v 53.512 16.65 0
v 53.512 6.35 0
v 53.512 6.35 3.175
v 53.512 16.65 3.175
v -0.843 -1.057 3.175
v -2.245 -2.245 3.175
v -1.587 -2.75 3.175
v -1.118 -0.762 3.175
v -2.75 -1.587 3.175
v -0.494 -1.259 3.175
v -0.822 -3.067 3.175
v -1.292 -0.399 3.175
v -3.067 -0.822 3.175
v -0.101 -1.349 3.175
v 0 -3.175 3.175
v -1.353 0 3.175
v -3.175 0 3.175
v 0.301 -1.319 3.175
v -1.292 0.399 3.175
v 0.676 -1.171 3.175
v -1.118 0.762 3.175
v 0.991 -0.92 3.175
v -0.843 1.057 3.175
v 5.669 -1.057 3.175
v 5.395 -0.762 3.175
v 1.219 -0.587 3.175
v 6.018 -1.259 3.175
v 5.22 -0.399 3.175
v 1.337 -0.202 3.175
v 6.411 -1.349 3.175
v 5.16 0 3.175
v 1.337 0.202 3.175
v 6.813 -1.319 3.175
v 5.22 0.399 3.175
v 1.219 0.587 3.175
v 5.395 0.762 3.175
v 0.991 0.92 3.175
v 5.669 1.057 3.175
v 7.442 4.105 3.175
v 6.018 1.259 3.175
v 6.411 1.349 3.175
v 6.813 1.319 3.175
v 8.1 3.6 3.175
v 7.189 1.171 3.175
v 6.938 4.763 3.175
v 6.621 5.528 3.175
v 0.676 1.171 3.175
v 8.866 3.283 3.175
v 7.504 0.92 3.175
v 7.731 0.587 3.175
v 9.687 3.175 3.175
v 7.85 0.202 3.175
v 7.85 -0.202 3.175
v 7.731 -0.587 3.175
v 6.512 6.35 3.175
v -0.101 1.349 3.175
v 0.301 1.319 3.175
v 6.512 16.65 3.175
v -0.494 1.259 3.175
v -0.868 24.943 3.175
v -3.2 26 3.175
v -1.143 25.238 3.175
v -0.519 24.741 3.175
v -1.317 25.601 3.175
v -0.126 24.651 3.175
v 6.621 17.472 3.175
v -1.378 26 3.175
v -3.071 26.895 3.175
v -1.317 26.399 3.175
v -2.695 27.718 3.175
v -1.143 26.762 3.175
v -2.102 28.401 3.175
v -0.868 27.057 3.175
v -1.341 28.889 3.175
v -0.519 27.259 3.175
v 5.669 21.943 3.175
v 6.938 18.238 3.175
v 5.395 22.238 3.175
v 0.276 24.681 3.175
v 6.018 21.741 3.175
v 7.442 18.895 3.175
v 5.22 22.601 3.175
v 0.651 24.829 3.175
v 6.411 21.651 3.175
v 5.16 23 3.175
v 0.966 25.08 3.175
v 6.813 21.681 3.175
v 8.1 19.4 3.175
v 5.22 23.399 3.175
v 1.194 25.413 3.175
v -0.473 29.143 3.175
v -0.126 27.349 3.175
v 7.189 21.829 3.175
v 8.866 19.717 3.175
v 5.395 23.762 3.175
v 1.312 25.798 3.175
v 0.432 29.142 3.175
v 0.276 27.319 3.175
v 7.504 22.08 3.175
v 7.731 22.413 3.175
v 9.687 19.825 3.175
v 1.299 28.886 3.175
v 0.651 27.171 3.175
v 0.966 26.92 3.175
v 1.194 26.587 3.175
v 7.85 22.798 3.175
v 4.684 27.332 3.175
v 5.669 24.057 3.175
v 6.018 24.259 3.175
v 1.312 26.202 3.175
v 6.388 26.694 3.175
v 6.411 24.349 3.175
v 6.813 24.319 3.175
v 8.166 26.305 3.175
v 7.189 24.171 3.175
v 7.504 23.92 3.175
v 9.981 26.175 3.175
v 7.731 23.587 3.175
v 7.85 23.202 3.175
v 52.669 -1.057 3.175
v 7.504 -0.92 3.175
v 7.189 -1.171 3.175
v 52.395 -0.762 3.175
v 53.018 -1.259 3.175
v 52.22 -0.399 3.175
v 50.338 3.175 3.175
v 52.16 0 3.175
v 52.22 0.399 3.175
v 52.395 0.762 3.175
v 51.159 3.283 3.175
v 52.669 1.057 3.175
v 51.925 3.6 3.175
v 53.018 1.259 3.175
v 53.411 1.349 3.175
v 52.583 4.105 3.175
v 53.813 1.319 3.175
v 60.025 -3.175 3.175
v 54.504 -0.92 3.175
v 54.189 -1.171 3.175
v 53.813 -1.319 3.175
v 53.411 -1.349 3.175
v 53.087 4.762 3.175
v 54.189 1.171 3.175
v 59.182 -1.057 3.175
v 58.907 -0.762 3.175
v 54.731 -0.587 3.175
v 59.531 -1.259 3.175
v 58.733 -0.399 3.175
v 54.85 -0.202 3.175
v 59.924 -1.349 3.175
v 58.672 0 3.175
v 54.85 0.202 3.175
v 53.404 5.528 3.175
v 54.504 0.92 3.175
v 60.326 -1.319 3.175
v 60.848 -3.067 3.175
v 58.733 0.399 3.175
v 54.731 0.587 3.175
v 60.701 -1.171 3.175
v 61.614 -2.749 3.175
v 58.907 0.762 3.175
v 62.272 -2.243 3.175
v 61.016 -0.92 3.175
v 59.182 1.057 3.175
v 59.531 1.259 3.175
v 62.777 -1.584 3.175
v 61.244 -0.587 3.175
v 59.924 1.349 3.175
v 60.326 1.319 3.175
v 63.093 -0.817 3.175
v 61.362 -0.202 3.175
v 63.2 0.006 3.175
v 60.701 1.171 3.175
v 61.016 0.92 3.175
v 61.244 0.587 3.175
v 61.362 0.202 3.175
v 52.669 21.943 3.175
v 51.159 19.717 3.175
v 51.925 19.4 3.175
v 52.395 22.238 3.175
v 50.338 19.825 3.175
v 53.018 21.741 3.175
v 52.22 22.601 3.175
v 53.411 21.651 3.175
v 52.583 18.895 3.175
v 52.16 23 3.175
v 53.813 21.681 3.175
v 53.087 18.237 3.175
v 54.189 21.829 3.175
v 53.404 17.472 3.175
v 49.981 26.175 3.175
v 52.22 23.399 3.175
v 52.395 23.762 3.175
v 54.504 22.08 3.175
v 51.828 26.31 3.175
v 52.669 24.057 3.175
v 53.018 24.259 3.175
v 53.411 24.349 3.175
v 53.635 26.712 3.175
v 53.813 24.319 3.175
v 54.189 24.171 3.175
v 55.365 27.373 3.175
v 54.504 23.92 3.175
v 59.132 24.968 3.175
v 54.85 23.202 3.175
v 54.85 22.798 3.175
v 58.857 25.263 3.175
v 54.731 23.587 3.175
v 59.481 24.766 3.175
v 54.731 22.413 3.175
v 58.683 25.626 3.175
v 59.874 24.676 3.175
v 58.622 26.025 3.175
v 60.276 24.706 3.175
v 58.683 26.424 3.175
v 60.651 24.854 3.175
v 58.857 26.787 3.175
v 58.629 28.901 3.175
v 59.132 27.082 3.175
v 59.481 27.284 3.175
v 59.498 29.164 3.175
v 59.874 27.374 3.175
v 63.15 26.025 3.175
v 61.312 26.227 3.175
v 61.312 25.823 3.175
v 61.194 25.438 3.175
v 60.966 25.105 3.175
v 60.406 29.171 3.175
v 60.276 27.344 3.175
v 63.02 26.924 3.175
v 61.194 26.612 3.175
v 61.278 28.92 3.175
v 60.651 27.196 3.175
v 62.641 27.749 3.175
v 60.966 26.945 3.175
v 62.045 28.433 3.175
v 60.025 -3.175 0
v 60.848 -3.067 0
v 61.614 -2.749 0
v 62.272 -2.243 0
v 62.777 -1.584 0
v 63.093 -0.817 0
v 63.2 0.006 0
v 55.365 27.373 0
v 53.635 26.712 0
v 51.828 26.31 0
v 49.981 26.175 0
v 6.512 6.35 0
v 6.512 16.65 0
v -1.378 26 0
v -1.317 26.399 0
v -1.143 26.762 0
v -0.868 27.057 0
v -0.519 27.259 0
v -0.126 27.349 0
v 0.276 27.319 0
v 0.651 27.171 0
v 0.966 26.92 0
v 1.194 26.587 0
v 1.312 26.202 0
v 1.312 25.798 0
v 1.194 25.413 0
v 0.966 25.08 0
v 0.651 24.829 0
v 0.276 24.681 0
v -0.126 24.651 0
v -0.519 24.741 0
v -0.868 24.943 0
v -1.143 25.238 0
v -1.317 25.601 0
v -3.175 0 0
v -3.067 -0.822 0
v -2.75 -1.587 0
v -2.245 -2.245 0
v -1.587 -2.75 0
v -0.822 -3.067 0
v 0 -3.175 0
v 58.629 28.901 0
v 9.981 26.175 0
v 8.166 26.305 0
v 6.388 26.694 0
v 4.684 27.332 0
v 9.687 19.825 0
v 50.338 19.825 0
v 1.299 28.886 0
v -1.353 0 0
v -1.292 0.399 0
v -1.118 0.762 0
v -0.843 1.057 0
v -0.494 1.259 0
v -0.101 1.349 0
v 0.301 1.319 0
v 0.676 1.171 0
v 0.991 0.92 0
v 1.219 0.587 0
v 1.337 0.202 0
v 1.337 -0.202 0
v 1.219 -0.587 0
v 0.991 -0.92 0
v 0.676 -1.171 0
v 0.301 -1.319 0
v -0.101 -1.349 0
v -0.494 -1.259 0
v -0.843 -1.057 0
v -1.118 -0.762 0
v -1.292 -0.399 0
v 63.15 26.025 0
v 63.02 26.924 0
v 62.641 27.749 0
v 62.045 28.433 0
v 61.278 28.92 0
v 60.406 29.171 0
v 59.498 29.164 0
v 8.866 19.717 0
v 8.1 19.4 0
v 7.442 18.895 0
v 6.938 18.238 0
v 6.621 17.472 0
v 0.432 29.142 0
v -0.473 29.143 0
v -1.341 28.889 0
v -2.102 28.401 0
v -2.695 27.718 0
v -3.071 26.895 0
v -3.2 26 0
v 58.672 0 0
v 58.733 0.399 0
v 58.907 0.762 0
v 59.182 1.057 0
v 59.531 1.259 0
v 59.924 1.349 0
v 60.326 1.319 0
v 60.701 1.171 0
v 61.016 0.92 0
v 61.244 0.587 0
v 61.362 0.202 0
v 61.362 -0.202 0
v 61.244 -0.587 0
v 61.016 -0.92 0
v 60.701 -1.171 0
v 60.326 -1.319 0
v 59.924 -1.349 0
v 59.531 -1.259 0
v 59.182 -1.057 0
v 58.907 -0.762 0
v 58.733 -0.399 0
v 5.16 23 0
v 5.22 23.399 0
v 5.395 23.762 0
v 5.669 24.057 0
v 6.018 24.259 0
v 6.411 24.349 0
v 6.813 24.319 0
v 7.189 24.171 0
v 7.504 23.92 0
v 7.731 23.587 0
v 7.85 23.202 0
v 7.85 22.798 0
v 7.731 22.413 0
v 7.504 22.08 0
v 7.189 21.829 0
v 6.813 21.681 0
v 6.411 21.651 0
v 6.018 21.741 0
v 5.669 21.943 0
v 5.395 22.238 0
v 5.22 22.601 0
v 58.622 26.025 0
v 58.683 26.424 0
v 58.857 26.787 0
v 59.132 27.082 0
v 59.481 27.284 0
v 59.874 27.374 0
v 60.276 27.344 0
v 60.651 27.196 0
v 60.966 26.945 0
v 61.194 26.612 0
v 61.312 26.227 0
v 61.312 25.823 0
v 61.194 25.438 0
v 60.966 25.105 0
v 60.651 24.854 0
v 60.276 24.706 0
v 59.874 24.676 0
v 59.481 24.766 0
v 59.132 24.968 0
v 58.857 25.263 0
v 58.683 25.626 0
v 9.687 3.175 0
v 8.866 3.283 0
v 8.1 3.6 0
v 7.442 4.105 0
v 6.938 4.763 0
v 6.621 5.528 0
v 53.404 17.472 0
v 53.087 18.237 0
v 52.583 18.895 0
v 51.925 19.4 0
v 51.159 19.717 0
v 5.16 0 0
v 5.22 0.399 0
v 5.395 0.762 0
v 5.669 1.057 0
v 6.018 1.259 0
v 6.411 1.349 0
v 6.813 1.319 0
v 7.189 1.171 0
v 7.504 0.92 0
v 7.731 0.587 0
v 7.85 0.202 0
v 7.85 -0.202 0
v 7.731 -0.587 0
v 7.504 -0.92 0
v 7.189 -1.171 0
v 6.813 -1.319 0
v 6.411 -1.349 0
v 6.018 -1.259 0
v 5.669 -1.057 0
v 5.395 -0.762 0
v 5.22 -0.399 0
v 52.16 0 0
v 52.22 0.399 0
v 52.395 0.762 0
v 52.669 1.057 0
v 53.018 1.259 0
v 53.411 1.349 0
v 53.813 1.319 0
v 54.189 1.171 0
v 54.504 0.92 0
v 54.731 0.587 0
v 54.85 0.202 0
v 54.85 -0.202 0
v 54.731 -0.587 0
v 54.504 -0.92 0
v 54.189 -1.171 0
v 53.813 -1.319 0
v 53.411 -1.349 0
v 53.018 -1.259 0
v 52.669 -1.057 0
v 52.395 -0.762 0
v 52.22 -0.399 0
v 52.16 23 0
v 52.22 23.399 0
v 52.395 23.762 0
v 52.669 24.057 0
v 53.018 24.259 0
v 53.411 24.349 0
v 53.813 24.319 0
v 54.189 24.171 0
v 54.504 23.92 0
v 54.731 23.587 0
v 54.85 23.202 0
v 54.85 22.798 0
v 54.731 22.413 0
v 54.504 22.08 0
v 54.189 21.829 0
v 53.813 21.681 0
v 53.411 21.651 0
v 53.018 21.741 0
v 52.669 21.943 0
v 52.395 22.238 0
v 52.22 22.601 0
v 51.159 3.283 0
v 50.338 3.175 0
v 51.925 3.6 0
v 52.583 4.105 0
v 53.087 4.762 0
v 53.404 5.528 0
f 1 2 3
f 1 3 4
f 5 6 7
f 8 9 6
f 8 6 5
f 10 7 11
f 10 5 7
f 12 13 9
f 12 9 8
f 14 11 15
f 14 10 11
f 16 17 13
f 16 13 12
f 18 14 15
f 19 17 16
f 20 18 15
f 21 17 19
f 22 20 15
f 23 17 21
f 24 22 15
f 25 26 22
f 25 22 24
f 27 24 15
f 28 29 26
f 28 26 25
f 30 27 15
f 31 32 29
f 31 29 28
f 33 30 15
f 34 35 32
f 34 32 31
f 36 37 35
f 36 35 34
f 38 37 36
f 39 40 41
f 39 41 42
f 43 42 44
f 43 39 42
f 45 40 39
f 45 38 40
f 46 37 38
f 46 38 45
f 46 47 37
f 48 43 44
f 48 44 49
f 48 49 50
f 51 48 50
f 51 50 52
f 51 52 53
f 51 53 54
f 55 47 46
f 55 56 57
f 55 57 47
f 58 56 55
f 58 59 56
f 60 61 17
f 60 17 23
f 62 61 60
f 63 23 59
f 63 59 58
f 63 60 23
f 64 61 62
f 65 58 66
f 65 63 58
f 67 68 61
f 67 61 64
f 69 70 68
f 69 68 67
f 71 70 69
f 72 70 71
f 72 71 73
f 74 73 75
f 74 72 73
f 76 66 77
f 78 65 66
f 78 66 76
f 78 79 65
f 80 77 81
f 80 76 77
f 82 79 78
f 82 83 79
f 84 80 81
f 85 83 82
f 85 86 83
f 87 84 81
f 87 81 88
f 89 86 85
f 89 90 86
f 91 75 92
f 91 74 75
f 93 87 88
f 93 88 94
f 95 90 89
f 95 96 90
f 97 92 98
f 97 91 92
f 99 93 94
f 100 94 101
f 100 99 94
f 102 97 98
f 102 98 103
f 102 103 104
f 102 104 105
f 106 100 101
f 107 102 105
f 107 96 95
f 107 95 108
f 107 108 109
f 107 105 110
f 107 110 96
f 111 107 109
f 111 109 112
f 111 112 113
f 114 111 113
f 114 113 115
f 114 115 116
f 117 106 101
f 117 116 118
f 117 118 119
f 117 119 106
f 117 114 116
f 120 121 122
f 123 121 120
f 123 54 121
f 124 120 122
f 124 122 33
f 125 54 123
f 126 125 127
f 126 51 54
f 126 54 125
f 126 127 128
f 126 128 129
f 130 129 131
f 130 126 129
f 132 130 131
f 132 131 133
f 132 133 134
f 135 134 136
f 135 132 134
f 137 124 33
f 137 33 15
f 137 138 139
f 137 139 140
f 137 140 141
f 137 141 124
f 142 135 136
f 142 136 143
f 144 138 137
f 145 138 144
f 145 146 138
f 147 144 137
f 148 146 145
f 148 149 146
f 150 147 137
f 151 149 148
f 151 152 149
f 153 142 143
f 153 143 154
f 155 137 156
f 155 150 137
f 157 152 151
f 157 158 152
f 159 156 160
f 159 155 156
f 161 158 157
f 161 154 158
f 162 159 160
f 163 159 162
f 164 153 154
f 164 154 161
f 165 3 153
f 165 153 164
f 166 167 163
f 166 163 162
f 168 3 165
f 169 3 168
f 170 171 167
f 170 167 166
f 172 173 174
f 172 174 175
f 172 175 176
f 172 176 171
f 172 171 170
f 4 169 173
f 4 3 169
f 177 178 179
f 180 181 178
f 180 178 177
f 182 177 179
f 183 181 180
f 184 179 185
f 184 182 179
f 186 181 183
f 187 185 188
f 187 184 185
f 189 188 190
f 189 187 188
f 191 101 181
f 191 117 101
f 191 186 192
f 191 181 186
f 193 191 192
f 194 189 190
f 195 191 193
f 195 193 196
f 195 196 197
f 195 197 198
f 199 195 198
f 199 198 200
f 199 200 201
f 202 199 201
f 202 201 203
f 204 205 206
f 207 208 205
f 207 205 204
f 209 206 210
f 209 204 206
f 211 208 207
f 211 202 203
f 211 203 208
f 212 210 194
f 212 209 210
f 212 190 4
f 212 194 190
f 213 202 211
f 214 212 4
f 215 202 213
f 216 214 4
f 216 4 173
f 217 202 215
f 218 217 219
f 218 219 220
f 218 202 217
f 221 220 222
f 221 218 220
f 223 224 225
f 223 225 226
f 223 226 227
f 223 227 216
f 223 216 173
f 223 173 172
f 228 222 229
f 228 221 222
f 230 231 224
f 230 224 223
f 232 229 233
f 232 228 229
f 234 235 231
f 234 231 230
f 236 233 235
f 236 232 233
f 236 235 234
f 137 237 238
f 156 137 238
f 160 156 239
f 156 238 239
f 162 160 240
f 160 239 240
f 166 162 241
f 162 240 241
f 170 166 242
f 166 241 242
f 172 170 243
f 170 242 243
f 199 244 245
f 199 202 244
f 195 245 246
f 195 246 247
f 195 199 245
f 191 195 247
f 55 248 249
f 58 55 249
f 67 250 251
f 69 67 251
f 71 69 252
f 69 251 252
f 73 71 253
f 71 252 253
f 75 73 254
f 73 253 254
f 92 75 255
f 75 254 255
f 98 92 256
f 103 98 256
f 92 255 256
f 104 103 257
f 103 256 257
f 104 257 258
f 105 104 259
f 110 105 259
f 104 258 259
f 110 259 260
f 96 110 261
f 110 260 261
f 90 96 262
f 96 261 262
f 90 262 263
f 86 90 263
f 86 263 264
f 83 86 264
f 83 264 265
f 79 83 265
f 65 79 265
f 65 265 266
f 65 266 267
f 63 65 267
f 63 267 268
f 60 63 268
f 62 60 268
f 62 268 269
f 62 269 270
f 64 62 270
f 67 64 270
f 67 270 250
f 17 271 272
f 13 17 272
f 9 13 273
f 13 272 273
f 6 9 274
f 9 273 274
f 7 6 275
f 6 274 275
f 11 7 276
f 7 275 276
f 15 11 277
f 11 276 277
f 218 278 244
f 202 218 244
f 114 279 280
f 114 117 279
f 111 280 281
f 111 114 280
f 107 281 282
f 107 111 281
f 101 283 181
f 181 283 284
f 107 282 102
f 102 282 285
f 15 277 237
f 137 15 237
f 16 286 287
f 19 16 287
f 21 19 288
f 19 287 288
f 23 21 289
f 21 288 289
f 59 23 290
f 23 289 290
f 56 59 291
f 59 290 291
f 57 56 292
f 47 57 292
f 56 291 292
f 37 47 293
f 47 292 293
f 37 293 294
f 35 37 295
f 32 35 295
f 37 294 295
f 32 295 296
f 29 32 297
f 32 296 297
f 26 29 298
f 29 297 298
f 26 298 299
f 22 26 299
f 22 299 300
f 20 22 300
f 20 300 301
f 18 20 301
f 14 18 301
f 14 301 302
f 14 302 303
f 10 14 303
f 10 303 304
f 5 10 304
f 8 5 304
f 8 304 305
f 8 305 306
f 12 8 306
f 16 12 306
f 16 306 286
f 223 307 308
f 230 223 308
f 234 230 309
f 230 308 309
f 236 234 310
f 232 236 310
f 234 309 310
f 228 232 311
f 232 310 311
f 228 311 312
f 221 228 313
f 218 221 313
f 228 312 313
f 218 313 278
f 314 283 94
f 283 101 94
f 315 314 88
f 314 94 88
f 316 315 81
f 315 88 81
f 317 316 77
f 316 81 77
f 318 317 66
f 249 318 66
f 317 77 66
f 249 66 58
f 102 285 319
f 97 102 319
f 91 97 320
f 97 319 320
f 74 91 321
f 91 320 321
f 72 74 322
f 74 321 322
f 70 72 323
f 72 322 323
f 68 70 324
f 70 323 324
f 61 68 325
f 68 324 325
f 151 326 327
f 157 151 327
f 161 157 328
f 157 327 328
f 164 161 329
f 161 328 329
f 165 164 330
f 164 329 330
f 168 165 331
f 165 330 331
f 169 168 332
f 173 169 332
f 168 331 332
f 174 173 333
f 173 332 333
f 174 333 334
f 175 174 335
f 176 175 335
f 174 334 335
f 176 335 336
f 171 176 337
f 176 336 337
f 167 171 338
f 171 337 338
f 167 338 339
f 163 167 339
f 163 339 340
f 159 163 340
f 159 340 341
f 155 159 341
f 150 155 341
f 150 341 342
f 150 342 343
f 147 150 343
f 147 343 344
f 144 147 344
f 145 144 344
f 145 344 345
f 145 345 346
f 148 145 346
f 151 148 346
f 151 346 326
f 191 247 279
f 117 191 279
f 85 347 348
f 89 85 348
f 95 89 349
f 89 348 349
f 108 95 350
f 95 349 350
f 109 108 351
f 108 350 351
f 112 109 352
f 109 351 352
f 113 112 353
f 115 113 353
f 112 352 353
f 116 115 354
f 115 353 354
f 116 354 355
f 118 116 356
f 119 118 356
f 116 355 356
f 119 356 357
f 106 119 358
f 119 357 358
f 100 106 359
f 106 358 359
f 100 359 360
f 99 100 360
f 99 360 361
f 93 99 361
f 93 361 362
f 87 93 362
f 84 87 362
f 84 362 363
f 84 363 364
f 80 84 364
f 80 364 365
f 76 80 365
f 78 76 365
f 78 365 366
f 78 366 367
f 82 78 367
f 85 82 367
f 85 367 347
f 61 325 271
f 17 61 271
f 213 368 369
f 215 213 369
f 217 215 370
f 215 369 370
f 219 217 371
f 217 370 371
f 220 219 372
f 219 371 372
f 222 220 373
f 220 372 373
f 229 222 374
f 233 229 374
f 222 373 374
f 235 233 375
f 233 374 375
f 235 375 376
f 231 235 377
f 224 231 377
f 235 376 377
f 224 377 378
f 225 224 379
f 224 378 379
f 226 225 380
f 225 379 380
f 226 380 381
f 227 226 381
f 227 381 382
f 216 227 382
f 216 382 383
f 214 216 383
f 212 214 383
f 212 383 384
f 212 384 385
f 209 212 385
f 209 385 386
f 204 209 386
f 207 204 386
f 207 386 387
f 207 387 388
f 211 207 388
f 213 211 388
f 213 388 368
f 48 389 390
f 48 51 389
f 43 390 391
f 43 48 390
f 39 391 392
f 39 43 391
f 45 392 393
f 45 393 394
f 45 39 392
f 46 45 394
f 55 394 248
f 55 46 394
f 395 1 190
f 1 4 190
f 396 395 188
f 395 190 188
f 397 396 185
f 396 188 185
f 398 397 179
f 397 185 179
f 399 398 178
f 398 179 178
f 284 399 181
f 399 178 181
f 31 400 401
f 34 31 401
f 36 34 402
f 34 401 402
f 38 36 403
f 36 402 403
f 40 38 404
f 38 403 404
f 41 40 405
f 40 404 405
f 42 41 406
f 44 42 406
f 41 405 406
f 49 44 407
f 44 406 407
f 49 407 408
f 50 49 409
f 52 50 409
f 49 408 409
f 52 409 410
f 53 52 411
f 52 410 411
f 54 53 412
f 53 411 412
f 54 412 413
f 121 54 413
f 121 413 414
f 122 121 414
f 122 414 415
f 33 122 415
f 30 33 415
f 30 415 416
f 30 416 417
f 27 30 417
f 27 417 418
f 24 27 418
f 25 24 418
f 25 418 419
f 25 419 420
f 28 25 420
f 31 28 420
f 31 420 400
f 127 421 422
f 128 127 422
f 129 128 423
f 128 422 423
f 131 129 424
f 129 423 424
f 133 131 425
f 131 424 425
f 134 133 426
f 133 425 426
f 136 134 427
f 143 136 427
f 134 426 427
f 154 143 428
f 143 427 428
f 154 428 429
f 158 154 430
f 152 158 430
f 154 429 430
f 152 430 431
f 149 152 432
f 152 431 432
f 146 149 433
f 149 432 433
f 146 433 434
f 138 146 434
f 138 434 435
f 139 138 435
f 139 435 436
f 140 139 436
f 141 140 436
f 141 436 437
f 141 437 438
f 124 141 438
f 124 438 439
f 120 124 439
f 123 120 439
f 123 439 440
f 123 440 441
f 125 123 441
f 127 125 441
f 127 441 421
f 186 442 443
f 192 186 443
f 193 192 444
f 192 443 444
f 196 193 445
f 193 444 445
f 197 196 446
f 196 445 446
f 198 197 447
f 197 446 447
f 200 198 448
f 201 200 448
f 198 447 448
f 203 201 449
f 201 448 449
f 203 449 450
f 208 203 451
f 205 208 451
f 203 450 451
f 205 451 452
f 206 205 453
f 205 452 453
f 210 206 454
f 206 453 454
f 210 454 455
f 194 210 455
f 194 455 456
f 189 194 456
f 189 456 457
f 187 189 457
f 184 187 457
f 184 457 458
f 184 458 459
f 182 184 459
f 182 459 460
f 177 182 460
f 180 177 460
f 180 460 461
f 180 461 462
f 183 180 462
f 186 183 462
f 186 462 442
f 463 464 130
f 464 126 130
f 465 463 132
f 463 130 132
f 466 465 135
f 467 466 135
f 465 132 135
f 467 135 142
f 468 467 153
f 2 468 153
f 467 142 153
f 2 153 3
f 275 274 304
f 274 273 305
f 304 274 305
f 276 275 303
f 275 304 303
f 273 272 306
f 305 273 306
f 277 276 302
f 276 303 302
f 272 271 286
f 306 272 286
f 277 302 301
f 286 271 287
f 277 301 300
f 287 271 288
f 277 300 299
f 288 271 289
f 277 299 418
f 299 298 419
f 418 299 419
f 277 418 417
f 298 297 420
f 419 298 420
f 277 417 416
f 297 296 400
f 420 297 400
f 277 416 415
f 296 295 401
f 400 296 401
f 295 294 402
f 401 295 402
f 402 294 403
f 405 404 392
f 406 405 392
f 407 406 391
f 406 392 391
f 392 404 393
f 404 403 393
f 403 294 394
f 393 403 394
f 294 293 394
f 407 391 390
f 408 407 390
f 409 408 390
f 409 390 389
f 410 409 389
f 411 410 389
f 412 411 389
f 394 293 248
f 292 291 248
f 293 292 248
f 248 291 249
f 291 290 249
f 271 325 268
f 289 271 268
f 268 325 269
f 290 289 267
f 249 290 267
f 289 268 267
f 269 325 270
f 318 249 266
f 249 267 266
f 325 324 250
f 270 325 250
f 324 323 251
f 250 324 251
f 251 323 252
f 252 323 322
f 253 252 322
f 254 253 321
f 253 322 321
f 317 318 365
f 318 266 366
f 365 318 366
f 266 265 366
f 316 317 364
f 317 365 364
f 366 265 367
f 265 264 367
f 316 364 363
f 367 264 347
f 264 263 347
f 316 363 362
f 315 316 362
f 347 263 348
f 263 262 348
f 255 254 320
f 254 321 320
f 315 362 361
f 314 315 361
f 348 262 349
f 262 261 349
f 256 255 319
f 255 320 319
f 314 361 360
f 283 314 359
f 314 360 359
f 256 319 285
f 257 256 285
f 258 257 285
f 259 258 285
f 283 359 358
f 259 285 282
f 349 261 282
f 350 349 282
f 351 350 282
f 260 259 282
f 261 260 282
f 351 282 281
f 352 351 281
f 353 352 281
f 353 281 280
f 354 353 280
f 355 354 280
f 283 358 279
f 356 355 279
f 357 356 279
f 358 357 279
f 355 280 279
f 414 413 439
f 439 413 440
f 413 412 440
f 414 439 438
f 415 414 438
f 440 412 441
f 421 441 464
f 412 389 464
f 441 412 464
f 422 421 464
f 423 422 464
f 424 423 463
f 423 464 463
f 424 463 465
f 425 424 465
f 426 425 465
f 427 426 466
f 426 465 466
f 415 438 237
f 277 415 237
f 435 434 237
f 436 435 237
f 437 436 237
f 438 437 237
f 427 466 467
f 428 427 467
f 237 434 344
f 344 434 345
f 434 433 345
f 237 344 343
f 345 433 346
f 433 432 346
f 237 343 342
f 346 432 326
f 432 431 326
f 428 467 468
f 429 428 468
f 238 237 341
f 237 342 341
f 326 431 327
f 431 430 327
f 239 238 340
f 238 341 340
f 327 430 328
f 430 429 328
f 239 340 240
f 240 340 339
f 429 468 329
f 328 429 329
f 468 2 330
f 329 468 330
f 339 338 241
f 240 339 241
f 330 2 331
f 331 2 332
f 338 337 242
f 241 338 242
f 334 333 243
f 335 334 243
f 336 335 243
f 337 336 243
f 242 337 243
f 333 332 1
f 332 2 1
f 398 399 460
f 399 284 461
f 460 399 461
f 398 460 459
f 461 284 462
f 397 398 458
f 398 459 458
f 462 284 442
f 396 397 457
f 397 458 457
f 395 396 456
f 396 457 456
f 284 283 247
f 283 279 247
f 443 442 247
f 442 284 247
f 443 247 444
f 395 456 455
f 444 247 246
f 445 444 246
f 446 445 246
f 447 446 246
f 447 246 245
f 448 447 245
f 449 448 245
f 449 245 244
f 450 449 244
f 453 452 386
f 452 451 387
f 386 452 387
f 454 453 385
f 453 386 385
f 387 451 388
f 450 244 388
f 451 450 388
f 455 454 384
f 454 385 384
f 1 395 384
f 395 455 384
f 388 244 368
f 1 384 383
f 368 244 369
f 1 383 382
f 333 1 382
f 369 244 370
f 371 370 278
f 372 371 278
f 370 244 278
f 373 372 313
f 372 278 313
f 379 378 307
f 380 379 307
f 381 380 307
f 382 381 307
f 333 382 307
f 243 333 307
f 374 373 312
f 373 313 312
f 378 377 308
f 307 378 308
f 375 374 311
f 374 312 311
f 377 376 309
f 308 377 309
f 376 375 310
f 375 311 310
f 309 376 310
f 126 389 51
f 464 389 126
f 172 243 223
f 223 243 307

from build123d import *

# Parameters (mm, degrees)
SKETCH2_W             = 47
SKETCH2_H             = 16.65
BOSS_EXTRUDE1_DEPTH   = 3.175
FILLET1_R             = 3.175
FILLET2_R             = 12.7
F_2_CLEARANCE_HOLE1_D = 2.7051
F_2_CLEARANCE_HOLE2_D = 2.7051


with BuildPart() as part:
    # Sketch2 → Boss-Extrude1 (new body)
    with BuildSketch(Plane.XY):
        with BuildLine():
            Line((58.628990163, 28.900566469), (52.80618907, 26.175))
            Line((52.80618907, 26.175), (7.206212285, 26.175))
            Line((7.206212285, 26.175), (1.299208473, 28.885670965))
            ThreePointArc((1.299208473, 28.885670965), (-1.739097882, 28.672544378), (-3.2, 26))
            Line((-3.2, 26), (-3.175, 0))
            ThreePointArc((-3.175, 0), (-2.24506403, -2.24506403), (0, -3.175))
            Line((0, -3.175), (60.025, -3.175))
            ThreePointArc((60.025, -3.175), (62.272219886, -2.242906103), (63.199994139, 0.006100608))
            Line((63.199994139, 0.006100608), (63.15, 26.025))
            ThreePointArc((63.15, 26.025), (61.678972384, 28.704011593), (58.628990163, 28.900566469))
        make_face()
        with Locations((30.0125, 11.5)):
            Rectangle(SKETCH2_W, SKETCH2_H, mode=Mode.SUBTRACT)
    extrude(amount=BOSS_EXTRUDE1_DEPTH)

    # Fillet1
    fillet1_edges = [part.edges().sort_by_distance(p)[0] for p in [
        (6.5125, 3.175, 1.5875),
        (53.5125, 3.175, 1.5875),
        (53.5125, 19.825, 1.5875),
        (6.5125, 19.825, 1.5875),
    ]]
    fillet(fillet1_edges, radius=FILLET1_R)

    # Fillet2
    fillet2_edges = [part.edges().sort_by_distance(p)[0] for p in [
        (7.206212285, 26.175, 1.5875),
        (52.80618907, 26.175, 1.5875),
    ]]
    fillet(fillet2_edges, radius=FILLET2_R)

    # #2 Clearance Hole1 (through all)
    with Locations(Plane.XY.offset(3.175)):
        with Locations((6.5125, 23), (53.5125, 23), (53.5125, 0), (6.5125, 0)):
            Hole(F_2_CLEARANCE_HOLE1_D / 2)

    # #2 Clearance Hole2 (through all)
    with Locations(Plane.XY.offset(3.175)):
        with Locations((-0.025, 26), (0, 0), (60.025, 0), (59.975, 26.025)):
            Hole(F_2_CLEARANCE_HOLE2_D / 2)


solid = part.part
